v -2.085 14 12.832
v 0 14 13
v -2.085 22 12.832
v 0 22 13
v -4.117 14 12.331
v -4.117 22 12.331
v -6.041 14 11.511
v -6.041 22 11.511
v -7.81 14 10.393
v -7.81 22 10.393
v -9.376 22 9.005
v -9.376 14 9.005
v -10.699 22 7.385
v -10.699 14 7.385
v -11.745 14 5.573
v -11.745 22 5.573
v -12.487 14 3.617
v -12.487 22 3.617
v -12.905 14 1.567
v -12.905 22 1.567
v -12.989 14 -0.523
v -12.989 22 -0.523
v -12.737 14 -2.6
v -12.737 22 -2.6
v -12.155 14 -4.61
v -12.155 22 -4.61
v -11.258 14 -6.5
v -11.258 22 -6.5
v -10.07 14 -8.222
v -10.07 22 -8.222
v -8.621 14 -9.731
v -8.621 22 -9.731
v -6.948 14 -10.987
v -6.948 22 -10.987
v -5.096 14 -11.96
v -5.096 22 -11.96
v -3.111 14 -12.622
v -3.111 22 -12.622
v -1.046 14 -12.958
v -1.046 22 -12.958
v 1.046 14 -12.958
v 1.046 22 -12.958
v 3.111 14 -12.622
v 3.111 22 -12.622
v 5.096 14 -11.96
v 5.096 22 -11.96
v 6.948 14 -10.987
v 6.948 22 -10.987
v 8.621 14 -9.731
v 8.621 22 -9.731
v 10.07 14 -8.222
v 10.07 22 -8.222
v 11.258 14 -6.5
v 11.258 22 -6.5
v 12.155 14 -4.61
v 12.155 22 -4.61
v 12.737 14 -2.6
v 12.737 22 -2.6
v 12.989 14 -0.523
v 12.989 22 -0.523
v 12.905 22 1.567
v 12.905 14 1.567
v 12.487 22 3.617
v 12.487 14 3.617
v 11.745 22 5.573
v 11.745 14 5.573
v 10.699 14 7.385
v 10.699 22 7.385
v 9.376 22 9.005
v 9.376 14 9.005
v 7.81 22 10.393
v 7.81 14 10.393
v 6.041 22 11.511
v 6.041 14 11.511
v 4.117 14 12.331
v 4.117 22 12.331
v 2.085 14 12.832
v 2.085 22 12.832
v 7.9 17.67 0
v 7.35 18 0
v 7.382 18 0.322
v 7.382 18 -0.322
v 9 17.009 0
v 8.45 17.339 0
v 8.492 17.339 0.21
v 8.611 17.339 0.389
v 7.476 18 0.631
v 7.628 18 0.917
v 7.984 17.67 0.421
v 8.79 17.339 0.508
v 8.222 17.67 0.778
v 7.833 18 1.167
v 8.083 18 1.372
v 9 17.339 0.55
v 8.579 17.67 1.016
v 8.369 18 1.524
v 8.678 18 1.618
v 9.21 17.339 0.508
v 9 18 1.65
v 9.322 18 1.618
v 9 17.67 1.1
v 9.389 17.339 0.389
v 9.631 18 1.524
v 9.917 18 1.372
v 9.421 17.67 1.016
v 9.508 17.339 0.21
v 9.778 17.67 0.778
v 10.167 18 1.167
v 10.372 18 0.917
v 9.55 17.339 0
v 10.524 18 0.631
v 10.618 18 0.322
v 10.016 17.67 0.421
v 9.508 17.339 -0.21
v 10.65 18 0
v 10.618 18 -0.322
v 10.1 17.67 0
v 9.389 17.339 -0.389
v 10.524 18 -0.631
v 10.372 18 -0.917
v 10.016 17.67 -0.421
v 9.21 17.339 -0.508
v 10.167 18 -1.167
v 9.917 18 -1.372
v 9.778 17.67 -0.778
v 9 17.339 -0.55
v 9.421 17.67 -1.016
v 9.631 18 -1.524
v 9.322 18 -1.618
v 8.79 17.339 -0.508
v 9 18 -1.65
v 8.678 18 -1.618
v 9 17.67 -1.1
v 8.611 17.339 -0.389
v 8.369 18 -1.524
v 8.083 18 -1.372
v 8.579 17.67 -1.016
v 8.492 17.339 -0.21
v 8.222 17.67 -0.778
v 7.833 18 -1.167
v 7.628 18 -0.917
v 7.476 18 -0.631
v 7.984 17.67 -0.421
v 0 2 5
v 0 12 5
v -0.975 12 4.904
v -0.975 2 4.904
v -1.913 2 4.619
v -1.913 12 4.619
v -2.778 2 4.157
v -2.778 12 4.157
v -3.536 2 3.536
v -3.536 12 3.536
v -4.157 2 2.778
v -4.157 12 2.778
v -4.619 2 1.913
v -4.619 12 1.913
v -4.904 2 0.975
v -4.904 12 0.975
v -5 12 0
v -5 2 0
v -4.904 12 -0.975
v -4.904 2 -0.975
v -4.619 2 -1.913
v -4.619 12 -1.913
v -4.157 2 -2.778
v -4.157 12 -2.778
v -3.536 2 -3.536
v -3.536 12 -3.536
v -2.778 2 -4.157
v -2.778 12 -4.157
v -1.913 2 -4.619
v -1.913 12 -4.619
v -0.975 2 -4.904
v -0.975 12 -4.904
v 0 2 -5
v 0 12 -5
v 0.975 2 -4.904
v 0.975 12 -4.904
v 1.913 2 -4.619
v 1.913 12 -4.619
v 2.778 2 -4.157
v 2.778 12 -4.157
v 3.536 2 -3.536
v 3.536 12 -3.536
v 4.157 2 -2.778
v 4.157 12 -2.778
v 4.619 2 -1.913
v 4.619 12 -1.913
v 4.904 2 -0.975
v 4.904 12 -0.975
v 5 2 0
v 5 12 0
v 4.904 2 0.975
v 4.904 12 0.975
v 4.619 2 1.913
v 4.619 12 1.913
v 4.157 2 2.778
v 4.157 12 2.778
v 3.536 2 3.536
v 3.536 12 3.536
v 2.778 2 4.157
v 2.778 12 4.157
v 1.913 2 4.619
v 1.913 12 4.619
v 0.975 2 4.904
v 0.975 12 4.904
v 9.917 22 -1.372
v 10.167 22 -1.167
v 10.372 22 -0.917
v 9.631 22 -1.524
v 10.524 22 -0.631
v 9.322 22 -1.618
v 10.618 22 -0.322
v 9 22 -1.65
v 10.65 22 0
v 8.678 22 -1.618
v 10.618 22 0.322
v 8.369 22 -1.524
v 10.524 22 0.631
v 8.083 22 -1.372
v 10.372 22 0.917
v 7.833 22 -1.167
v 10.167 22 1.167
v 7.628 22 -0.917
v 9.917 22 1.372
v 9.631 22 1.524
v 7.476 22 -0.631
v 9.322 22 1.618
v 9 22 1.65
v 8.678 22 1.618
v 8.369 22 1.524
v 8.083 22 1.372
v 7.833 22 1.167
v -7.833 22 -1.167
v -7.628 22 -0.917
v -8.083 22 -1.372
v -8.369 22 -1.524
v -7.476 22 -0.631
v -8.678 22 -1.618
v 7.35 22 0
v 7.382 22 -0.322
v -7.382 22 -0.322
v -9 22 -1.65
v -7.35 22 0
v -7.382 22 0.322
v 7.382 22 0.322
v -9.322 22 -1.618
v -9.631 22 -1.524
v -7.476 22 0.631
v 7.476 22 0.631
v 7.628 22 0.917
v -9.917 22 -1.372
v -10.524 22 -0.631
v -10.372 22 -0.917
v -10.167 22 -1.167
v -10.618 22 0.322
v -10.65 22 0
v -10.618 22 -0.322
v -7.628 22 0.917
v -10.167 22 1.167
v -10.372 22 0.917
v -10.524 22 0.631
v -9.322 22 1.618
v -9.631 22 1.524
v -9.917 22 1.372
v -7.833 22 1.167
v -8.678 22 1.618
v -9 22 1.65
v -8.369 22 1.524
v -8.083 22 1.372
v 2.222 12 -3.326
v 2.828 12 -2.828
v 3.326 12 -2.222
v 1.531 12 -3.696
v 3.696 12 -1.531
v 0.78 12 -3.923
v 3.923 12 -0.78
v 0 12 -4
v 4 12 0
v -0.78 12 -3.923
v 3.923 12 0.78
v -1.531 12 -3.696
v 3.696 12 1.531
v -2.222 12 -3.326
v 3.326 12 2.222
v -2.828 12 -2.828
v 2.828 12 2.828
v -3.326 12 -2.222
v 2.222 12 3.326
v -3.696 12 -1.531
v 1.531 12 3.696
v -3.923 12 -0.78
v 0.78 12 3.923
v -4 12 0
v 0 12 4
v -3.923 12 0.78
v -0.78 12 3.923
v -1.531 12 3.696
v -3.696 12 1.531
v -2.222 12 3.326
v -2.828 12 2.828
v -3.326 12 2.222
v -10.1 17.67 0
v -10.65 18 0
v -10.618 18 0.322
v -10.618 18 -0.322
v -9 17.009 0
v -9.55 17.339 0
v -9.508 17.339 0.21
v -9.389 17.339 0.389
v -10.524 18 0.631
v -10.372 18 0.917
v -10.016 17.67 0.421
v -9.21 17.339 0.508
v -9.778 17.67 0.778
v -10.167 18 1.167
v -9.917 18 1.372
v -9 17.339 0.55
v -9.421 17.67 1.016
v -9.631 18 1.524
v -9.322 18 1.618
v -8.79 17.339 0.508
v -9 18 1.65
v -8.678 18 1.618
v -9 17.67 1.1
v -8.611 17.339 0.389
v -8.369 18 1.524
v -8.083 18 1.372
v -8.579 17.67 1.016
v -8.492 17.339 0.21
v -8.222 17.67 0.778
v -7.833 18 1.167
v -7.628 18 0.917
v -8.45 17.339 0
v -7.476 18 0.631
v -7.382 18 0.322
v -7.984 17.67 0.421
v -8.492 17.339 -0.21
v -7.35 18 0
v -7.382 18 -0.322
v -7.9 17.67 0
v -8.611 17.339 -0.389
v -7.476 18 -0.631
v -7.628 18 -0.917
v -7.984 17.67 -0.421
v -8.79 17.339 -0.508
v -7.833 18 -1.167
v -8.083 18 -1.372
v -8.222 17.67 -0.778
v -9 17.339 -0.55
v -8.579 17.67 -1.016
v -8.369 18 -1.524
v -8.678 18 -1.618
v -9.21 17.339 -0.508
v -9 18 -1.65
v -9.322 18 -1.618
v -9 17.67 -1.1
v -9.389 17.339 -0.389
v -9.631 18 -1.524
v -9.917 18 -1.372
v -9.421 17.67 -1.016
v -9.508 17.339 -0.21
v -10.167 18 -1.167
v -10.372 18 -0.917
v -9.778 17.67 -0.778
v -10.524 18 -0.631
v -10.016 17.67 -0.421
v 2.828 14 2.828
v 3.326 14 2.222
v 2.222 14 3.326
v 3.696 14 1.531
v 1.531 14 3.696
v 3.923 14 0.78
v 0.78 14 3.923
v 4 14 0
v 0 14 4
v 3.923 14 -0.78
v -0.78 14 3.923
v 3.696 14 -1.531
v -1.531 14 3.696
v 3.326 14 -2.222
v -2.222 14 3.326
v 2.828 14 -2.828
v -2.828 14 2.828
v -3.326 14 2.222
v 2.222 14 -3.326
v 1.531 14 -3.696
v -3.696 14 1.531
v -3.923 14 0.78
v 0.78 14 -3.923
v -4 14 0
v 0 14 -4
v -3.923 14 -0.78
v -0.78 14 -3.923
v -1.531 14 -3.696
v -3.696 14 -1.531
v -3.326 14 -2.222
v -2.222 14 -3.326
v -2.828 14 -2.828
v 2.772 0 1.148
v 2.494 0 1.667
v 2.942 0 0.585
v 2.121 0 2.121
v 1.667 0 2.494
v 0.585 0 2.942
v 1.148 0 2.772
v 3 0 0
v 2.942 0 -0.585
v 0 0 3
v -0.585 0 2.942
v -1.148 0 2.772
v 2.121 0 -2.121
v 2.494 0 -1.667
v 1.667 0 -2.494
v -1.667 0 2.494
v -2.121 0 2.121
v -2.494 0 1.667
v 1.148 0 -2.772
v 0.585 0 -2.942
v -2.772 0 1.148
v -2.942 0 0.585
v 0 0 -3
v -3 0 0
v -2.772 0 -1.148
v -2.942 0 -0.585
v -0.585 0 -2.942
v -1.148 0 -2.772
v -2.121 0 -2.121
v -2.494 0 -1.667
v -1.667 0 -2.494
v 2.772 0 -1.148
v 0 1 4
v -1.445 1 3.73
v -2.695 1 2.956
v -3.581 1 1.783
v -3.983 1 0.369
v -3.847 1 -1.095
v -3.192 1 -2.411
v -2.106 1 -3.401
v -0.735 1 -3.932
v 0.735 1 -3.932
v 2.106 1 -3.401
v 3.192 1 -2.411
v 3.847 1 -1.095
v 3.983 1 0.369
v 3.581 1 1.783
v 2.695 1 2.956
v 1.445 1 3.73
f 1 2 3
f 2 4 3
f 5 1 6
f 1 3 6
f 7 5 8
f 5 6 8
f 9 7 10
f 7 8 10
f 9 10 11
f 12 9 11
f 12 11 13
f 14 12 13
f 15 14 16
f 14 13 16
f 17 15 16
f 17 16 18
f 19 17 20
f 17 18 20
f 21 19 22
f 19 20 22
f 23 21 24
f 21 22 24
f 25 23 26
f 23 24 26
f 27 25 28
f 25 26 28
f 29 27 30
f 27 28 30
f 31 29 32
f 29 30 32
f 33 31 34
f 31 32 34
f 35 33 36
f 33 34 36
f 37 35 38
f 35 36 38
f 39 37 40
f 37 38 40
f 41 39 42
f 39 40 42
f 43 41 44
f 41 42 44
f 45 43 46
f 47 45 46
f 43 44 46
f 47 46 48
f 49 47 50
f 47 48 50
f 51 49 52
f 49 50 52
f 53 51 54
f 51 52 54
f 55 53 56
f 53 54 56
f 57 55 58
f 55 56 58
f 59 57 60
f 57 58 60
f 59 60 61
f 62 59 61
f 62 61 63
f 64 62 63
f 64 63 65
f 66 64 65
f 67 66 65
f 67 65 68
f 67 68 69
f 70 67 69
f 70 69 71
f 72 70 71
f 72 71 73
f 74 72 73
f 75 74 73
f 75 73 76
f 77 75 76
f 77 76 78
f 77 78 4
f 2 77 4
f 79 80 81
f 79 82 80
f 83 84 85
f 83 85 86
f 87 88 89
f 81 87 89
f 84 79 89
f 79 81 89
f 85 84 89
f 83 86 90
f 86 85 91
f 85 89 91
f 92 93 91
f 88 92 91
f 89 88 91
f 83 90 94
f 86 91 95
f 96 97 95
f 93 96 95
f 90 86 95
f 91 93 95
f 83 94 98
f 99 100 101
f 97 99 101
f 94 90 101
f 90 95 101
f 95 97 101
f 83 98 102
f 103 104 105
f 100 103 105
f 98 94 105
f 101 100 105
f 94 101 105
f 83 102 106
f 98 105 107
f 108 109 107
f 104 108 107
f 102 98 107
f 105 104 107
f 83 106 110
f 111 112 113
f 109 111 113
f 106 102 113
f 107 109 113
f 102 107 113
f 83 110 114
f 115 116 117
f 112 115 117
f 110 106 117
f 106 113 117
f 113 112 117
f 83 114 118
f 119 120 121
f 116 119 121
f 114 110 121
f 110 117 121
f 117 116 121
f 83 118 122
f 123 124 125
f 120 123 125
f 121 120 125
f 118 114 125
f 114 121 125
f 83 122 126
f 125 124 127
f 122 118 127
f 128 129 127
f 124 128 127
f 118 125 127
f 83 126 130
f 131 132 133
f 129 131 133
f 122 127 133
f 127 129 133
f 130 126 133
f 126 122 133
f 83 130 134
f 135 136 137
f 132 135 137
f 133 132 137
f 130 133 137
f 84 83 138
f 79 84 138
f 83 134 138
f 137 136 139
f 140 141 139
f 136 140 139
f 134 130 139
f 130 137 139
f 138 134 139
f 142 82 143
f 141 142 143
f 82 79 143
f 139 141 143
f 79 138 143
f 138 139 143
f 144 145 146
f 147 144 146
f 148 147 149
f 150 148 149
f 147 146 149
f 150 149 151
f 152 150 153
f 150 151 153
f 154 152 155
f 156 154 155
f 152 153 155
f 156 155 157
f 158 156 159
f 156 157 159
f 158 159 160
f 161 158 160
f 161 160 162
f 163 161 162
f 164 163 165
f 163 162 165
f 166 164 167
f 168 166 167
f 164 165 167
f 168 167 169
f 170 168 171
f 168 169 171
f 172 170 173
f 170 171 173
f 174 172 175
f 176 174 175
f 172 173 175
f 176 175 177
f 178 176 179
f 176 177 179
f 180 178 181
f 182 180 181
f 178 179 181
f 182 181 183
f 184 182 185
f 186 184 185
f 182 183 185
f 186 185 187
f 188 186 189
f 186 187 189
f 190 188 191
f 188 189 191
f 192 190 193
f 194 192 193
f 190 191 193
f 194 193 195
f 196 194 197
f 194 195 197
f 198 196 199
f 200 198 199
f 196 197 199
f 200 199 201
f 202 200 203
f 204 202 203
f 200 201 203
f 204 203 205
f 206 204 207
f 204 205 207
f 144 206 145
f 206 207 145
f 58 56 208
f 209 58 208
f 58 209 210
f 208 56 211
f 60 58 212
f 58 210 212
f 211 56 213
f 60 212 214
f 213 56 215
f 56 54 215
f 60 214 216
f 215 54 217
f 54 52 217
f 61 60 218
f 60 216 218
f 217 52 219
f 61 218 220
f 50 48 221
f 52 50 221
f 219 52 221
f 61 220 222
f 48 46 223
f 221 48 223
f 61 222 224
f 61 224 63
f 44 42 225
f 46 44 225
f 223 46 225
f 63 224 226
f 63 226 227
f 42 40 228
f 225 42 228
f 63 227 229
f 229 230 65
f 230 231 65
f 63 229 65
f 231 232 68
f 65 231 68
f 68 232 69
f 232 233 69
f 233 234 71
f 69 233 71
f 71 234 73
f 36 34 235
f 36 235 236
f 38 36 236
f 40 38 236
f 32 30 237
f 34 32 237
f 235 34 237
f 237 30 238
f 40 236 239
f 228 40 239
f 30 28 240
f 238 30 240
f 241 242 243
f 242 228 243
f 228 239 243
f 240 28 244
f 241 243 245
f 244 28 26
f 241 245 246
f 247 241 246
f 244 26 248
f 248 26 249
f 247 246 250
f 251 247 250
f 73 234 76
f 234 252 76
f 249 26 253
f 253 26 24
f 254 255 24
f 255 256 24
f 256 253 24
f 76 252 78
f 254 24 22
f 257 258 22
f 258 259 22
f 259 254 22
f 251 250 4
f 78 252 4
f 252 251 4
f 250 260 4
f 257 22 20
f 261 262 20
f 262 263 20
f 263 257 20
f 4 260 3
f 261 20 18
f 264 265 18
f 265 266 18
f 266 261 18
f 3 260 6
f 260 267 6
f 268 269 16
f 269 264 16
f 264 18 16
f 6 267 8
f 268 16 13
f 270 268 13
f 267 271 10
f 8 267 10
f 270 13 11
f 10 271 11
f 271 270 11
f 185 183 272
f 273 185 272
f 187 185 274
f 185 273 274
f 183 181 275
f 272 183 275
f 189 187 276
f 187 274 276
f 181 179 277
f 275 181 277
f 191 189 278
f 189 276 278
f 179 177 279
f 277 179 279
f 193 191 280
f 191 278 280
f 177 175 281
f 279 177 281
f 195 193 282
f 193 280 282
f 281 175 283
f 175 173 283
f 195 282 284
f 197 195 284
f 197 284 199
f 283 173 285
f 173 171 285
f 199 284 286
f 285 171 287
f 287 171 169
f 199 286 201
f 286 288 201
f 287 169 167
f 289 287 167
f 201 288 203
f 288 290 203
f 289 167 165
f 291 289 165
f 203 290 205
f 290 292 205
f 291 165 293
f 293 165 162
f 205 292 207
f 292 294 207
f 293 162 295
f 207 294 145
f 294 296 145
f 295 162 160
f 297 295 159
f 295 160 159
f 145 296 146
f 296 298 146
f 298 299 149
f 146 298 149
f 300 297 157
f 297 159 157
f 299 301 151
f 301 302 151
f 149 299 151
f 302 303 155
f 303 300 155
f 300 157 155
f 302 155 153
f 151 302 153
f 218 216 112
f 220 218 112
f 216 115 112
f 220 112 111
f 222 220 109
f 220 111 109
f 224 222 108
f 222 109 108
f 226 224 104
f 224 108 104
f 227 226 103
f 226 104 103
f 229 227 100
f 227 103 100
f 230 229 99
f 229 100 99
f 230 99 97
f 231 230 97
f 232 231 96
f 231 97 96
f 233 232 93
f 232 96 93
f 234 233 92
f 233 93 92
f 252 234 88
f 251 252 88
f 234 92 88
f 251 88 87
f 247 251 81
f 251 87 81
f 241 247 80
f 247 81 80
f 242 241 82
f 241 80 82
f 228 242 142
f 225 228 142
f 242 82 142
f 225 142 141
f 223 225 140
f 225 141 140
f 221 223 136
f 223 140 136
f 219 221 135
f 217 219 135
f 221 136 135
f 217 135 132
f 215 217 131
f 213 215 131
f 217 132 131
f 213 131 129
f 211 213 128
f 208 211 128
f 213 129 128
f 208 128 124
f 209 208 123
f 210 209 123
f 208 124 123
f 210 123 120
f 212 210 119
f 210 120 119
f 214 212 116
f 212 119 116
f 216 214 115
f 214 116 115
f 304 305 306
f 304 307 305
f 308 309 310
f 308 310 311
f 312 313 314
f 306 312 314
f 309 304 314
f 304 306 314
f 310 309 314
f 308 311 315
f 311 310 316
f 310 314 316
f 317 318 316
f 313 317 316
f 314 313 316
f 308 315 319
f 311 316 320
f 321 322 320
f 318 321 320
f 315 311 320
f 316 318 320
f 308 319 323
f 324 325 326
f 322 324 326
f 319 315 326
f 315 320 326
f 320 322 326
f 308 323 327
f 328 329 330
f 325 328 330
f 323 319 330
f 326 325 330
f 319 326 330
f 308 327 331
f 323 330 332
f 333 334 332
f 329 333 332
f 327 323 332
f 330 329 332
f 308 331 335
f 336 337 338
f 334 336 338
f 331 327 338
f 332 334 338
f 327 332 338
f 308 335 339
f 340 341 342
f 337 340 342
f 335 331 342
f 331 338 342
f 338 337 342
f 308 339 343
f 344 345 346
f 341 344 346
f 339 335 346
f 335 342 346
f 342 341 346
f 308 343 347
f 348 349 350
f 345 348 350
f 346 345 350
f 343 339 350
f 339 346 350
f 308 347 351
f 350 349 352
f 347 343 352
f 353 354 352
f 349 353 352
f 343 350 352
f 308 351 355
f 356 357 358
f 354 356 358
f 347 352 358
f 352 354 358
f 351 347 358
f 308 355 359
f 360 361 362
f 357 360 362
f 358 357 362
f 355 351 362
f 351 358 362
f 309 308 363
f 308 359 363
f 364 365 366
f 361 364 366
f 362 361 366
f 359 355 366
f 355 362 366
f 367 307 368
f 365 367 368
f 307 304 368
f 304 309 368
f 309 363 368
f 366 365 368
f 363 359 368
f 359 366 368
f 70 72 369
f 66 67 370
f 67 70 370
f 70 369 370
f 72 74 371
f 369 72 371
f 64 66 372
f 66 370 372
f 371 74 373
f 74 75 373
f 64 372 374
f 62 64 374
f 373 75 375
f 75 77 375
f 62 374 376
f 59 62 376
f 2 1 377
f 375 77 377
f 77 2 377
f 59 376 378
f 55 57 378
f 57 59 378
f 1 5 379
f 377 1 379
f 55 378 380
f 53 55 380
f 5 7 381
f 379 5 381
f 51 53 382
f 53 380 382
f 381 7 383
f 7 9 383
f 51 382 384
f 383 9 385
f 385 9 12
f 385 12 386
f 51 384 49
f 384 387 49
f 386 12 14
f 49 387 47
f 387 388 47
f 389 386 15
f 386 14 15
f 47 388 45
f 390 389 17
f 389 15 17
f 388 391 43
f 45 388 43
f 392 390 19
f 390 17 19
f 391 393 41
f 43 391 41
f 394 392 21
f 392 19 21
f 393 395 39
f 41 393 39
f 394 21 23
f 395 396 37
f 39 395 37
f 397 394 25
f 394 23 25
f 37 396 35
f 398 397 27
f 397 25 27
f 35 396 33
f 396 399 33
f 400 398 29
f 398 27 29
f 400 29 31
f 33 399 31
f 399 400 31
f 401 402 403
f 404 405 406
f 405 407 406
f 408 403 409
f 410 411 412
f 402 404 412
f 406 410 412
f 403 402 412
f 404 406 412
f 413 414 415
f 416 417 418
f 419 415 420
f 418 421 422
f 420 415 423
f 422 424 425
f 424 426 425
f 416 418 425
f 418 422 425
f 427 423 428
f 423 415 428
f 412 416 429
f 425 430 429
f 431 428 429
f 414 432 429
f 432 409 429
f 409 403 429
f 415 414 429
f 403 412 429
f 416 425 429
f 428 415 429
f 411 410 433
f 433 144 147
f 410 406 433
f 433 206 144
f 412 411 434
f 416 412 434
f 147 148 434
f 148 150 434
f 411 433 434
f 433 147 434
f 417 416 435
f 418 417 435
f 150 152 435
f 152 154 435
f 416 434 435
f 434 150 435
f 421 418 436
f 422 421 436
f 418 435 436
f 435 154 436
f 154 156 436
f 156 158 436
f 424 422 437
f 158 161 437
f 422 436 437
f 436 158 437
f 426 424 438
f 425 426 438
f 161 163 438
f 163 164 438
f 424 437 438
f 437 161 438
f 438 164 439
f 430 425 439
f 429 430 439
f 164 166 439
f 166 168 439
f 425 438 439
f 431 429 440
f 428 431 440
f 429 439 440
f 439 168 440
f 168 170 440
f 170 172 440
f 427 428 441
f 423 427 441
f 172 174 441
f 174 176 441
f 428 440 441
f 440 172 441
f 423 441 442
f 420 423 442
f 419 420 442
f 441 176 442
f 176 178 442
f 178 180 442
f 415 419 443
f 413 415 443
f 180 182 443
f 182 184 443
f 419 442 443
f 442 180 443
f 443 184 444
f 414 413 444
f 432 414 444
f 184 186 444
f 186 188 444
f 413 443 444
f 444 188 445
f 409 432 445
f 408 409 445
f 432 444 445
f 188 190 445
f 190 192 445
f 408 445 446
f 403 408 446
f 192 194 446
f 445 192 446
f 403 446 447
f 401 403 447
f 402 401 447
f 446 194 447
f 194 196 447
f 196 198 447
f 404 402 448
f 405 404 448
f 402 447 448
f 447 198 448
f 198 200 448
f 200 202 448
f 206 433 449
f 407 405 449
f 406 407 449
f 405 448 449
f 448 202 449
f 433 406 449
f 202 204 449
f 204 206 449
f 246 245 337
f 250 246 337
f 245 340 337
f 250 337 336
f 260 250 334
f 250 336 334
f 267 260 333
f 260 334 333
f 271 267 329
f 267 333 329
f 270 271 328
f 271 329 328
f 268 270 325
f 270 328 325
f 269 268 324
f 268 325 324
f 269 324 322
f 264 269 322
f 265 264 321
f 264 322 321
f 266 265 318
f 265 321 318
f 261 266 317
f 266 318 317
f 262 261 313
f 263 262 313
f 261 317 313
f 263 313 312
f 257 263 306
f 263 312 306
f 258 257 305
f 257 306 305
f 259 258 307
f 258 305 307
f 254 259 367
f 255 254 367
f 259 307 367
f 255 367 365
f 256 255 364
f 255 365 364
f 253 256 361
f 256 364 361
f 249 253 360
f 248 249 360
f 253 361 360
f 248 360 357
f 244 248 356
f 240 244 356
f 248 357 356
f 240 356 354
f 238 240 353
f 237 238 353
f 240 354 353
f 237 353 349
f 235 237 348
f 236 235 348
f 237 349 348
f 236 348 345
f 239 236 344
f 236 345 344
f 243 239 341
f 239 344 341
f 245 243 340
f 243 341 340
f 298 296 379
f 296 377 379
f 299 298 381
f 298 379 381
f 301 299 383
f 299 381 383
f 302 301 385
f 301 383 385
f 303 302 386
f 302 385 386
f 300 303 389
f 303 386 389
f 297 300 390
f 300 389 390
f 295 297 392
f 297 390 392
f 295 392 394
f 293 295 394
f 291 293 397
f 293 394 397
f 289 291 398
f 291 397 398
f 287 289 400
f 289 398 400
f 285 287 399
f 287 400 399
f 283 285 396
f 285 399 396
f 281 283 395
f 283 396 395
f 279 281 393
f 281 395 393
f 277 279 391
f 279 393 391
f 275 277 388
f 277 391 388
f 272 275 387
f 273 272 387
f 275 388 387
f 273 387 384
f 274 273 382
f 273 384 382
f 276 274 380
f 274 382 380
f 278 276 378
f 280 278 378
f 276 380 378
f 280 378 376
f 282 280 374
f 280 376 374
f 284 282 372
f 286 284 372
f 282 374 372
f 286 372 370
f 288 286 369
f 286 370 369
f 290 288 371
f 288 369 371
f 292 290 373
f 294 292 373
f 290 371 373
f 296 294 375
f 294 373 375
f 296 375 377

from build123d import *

# Parameters (mm, degrees)
CHAMFER_1_SIZE         = 2
HOLE_WIZARD_M4_1_D     = 3.3
HOLE_WIZARD_M4_1_DEPTH = 4
HOLE_WIZARD_M4_1_TIP   = 0.991420021


with BuildPart() as part:
    # 草图1 → 旋转1 (revolve)
    with BuildSketch(Plane.XY, mode=Mode.PRIVATE) as revolve_1_sk:
        Polygon((0, 0), (5, 0), (5, 12), (4, 12), (4, 14), (13, 14), (13, 22), (0, 22), align=None)
    revolve(revolve_1_sk.sketch.rotate(Axis((0, 60.790955631, 0), (0, -1, 0)), 90), axis=Axis((0, 60.790955631, 0), (0, -1, 0)))

    # 倒角1
    chamfer_1_edges = [part.edges().sort_by_distance(p)[0] for p in [
        (0, 0, -5),
    ]]
    chamfer(chamfer_1_edges, length=CHAMFER_1_SIZE)

    # M4 螺纹孔的螺纹孔钻头1
    with Locations(Plane(origin=(0, 22, 0), x_dir=(-1, 0, 0), z_dir=(0, 1, 0))):
        with Locations((9, 0), (-9, 0)):
            Hole(HOLE_WIZARD_M4_1_D / 2, depth=HOLE_WIZARD_M4_1_DEPTH)
            with Locations((0, 0, -(HOLE_WIZARD_M4_1_DEPTH + HOLE_WIZARD_M4_1_TIP / 2))):  # 118° drill point
                Cone(0, HOLE_WIZARD_M4_1_D / 2, HOLE_WIZARD_M4_1_TIP, mode=Mode.SUBTRACT)


solid = part.part
